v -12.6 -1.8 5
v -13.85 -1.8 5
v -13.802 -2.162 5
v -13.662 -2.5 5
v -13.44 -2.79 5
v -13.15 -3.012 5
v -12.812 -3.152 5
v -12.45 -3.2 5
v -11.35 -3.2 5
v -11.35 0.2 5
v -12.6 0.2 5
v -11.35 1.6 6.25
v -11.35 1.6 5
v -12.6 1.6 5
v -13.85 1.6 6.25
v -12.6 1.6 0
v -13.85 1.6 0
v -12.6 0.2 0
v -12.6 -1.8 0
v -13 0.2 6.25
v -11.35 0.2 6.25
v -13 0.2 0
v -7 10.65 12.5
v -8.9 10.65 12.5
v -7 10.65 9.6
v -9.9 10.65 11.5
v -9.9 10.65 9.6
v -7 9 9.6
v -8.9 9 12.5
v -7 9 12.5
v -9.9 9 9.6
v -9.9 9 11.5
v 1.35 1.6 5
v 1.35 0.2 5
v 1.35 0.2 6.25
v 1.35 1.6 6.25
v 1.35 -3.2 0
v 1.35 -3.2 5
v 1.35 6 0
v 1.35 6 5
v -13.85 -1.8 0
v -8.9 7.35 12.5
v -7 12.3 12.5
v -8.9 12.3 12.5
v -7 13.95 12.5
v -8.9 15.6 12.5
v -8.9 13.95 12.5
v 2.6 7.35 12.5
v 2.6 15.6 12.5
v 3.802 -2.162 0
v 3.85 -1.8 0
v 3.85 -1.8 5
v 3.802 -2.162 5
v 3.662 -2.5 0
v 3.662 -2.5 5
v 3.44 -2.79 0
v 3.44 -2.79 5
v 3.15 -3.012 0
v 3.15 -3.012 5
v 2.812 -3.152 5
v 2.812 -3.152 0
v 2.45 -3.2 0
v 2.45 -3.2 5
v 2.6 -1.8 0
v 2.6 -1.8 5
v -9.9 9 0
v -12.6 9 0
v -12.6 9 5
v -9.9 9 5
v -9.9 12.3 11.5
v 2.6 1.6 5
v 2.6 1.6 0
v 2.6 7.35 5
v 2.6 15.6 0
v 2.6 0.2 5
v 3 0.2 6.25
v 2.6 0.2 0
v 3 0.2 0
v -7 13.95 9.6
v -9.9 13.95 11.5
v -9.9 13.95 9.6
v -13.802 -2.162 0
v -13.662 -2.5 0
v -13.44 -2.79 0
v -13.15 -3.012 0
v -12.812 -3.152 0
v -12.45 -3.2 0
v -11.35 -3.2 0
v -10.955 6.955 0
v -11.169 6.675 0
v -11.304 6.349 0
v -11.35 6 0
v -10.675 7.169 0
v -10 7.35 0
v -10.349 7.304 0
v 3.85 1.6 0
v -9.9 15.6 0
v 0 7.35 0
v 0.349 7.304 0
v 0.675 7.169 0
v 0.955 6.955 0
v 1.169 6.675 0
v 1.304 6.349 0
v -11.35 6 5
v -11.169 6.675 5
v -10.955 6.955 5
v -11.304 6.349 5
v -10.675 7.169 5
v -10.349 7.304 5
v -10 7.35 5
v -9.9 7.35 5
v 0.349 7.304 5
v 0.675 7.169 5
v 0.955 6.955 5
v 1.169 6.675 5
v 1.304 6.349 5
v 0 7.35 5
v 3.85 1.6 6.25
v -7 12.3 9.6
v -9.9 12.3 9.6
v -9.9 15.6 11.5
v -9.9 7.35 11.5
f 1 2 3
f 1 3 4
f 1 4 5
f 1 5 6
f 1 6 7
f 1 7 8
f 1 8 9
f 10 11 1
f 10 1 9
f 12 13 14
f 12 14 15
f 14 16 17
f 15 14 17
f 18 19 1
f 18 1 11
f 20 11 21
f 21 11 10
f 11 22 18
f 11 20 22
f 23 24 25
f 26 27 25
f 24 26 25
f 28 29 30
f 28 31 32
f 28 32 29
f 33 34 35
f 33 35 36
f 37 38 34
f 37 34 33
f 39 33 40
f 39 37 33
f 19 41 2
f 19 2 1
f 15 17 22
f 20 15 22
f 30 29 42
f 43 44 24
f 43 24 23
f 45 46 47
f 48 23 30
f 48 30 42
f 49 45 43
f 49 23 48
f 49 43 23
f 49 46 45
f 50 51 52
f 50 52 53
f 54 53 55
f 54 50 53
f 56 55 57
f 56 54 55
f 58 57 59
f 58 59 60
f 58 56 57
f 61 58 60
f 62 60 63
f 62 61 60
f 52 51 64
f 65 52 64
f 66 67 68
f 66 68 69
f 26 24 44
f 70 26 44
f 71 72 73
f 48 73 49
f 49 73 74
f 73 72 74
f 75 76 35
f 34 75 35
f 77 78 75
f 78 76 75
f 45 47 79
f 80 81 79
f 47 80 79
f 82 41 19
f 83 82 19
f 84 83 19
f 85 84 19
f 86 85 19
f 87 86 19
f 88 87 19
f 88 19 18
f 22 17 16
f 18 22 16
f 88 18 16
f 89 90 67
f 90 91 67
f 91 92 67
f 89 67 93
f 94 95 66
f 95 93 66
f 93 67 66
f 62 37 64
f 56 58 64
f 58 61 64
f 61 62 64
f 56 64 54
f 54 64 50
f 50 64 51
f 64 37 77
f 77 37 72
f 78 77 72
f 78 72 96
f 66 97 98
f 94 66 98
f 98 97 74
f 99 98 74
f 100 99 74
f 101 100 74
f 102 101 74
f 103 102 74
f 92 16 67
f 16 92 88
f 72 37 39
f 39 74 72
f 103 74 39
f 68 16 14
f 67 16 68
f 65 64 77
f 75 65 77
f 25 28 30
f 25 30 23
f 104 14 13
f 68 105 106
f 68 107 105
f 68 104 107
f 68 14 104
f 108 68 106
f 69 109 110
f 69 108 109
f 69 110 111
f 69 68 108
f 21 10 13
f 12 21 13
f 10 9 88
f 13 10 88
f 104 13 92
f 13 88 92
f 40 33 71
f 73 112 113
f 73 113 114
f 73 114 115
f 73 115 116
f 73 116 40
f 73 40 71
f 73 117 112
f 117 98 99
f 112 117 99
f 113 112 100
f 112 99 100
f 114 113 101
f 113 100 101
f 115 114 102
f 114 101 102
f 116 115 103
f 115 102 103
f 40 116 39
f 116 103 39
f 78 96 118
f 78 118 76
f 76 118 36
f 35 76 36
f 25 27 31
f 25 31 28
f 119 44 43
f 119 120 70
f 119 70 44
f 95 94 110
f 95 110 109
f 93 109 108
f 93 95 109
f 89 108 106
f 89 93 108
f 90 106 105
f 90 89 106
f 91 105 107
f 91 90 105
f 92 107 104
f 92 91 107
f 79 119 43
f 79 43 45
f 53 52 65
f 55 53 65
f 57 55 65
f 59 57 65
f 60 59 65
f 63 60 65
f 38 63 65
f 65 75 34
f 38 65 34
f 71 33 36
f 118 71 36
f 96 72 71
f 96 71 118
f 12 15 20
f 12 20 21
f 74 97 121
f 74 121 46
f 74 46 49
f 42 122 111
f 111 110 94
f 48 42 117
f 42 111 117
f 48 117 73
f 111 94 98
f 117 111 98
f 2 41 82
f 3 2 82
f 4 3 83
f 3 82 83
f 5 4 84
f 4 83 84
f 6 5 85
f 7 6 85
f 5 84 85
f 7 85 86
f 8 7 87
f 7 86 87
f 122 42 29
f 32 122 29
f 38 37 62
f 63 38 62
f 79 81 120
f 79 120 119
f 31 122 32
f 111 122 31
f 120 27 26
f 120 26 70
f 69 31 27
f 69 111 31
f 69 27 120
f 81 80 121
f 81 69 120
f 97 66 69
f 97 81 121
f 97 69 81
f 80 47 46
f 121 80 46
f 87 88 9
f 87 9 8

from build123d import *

# Parameters (mm, degrees)
PAD017_DEPTH           = 5
PAD020_DEPTH           = 6.25
SKETCH038_W            = 10
SKETCH038_H            = 1.65
PAD021_DEPTH           = 5
SKETCH097_W            = 12.5
SKETCH097_H            = 1.65
PAD066_DEPTH           = 12.5
SKETCH094_W            = 12.5
SKETCH094_H            = 1.65
PAD067_DEPTH           = 9.6
SKETCH095_W            = 9.6
SKETCH095_H            = 1.65
PAD068_DEPTH           = 12.5
SKETCH096_W            = 12.5
SKETCH096_H            = 1.65
PAD069_DEPTH           = 12.5
LINEARPATTERN022_COUNT = 2
LINEARPATTERN022_PITCH = 3.3
CHAMFER012_SIZE        = 1


with BuildPart() as bc_c:
    # Sketch034 → Pad017 (new body)
    with BuildSketch(Plane.XY):
        with BuildLine():
            Line((-1.35, -1.8), (-1.35, 6))
            ThreePointArc((0, 7.35), (-0.954594, 6.954594), (-1.35, 6))
            Line((0, 9), (0, 7.35))
            Line((-2.6, 9), (0, 9))
            Line((-2.6, -1.8), (-2.6, 9))
            Line((-3.85, -1.8), (-2.6, -1.8))
            ThreePointArc((-3.85, -1.8), (-3.439949, -2.789949), (-2.45, -3.2))
            Line((-1.35, -3.2), (-2.45, -3.2))
            Line((-1.35, -1.8), (-1.35, -3.2))
        make_face()
    extrude(amount=PAD017_DEPTH)

    # Sketch037 → Pad020 (join)
    with BuildSketch(Plane.XY):
        Polygon((-1.35, 0.2), (-1.35, 1.6), (-2.6, 1.6), (-3.85, 1.6), (-3, 0.2), (-2.6, 0.2), align=None)
    extrude(amount=PAD020_DEPTH)


with BuildPart() as body035:
    # Mirror002: instance of _bc_c
    add(bc_c.part.mirror(Plane(origin=(5, 0, 0), x_dir=(0, 1, 0), z_dir=(-1, 0, 0))))

    # Fusion002: union _bc_c
    add(bc_c.part)


with BuildPart() as body035_1:
    # Clone003 placement: moved
    add(body035.part.moved(Location((-5, 0, 0))))

    # Sketch038 → Pad021 (new body)
    with BuildSketch(Plane.XY):
        with Locations((0, 8.175)):
            Rectangle(SKETCH038_W, SKETCH038_H)
    extrude(amount=PAD021_DEPTH)

    # Sketch097 → Pad066 (new body)
    with BuildSketch(Plane.XY):
        with Locations((1.35, 8.175)):
            Rectangle(SKETCH097_W, SKETCH097_H)
    extrude(amount=PAD066_DEPTH)

    # Sketch094 → Pad067 (join)
    with BuildSketch(Plane.XY):
        with Locations((1.35, 9.825)):
            Rectangle(SKETCH094_W, SKETCH094_H)
    pad067 = extrude(amount=PAD067_DEPTH)

    # Sketch095 → Pad068 (join)
    with BuildSketch(Plane.XY):
        with Locations((2.8, 9.825)):
            Rectangle(SKETCH095_W, SKETCH095_H)
    pad068 = extrude(amount=PAD068_DEPTH)

    # Sketch096 → Pad069 (join)
    with BuildSketch(Plane.XY):
        with Locations((1.35, 11.475)):
            Rectangle(SKETCH096_W, SKETCH096_H)
    pad069 = extrude(amount=PAD069_DEPTH)

    # LinearPattern022: Pad069, Pad068, Pad067 ×2
    with Locations(*[(0, i * LINEARPATTERN022_PITCH, 0) for i in range(1, LINEARPATTERN022_COUNT)]):
        add(pad069)
        add(pad068)
        add(pad067)

    # Chamfer012
    chamfer012_edges = [body035_1.edges().sort_by_distance(p)[0] for p in [
        (-4.9, 8.175, 12.5),
        (-4.9, 11.475, 12.5),
        (-4.9, 14.775, 12.5),
    ]]
    chamfer(chamfer012_edges, length=CHAMFER012_SIZE)


with BuildPart() as body035_2:
    # Body035 placement: moved
    add(body035_1.part.moved(Location((-5, 0, 0))))


solid = body035_2.part
